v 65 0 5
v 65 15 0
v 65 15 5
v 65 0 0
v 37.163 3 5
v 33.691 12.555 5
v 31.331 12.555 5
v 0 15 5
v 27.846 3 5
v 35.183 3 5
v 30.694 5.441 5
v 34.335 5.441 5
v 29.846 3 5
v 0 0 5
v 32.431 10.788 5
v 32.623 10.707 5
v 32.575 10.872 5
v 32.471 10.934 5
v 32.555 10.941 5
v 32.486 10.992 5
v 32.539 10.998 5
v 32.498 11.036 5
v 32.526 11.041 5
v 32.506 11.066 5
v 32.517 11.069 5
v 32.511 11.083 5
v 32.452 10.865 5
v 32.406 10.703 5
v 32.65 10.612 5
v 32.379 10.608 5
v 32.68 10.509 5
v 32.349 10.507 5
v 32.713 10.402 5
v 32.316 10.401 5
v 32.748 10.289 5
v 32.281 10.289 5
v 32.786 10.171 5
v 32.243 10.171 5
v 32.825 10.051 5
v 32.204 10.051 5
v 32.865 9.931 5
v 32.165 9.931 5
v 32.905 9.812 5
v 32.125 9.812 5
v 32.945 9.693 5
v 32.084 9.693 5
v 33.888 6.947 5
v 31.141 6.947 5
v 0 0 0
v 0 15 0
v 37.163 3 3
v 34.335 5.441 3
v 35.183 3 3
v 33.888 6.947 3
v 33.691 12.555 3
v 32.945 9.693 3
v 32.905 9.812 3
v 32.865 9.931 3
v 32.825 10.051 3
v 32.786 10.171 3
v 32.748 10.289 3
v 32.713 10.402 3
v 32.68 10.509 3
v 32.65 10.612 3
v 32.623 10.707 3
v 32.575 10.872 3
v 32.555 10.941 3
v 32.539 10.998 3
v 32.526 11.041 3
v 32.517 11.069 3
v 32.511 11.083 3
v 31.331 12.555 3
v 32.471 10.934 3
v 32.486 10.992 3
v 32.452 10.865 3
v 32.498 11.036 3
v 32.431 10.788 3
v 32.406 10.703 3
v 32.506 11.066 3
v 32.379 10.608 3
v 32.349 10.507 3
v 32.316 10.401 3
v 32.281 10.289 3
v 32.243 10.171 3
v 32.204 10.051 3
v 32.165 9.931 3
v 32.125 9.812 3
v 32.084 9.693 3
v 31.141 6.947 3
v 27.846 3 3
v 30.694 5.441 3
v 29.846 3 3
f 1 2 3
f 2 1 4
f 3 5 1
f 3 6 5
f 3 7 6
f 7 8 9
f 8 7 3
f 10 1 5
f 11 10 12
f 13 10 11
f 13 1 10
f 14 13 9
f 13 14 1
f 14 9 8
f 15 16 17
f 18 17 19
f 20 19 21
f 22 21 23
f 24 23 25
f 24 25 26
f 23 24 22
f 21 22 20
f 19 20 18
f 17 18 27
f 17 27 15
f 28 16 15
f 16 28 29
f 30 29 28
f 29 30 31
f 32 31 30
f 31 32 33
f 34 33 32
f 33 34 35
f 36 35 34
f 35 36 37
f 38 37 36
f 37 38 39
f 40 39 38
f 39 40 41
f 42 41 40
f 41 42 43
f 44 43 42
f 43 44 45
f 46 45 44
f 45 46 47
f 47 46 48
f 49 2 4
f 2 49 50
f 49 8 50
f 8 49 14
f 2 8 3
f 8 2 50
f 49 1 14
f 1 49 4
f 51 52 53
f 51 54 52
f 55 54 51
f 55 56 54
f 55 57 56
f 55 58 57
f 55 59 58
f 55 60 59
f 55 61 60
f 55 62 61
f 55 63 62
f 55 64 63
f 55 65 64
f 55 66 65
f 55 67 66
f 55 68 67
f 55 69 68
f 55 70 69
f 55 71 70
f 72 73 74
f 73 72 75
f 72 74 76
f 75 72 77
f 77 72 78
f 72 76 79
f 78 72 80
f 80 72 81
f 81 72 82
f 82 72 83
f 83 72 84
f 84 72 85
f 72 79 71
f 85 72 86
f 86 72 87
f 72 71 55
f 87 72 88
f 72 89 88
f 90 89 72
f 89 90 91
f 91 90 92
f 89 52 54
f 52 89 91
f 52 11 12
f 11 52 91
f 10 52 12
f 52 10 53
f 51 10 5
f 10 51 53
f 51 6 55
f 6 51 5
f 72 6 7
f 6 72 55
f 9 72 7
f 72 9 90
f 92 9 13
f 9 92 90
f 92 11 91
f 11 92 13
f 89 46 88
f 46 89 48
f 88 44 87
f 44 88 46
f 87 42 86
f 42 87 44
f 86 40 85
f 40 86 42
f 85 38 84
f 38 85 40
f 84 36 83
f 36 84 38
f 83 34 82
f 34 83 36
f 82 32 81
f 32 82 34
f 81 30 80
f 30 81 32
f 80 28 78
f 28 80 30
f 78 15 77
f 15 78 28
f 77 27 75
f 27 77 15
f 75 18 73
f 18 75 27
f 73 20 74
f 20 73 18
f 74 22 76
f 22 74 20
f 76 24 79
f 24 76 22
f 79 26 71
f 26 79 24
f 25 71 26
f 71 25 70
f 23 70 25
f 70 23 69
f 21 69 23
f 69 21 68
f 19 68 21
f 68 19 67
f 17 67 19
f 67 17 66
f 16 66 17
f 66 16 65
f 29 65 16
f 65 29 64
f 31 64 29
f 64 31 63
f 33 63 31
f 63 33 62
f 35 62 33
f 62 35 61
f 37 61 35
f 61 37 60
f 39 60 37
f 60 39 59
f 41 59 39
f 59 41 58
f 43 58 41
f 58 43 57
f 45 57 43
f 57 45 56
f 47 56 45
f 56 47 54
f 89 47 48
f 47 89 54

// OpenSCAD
difference(){
	union(){ 
        translate([0,0,0]){
           cube([65,15,5], center=false);
        }                
	}
	union() {
        translate([60-65/2, 3,3]){
            linear_extrude(height = 10) {
                text("A", size = 10, font="Arial:style=Bold");
            }
        }                


	}
}
